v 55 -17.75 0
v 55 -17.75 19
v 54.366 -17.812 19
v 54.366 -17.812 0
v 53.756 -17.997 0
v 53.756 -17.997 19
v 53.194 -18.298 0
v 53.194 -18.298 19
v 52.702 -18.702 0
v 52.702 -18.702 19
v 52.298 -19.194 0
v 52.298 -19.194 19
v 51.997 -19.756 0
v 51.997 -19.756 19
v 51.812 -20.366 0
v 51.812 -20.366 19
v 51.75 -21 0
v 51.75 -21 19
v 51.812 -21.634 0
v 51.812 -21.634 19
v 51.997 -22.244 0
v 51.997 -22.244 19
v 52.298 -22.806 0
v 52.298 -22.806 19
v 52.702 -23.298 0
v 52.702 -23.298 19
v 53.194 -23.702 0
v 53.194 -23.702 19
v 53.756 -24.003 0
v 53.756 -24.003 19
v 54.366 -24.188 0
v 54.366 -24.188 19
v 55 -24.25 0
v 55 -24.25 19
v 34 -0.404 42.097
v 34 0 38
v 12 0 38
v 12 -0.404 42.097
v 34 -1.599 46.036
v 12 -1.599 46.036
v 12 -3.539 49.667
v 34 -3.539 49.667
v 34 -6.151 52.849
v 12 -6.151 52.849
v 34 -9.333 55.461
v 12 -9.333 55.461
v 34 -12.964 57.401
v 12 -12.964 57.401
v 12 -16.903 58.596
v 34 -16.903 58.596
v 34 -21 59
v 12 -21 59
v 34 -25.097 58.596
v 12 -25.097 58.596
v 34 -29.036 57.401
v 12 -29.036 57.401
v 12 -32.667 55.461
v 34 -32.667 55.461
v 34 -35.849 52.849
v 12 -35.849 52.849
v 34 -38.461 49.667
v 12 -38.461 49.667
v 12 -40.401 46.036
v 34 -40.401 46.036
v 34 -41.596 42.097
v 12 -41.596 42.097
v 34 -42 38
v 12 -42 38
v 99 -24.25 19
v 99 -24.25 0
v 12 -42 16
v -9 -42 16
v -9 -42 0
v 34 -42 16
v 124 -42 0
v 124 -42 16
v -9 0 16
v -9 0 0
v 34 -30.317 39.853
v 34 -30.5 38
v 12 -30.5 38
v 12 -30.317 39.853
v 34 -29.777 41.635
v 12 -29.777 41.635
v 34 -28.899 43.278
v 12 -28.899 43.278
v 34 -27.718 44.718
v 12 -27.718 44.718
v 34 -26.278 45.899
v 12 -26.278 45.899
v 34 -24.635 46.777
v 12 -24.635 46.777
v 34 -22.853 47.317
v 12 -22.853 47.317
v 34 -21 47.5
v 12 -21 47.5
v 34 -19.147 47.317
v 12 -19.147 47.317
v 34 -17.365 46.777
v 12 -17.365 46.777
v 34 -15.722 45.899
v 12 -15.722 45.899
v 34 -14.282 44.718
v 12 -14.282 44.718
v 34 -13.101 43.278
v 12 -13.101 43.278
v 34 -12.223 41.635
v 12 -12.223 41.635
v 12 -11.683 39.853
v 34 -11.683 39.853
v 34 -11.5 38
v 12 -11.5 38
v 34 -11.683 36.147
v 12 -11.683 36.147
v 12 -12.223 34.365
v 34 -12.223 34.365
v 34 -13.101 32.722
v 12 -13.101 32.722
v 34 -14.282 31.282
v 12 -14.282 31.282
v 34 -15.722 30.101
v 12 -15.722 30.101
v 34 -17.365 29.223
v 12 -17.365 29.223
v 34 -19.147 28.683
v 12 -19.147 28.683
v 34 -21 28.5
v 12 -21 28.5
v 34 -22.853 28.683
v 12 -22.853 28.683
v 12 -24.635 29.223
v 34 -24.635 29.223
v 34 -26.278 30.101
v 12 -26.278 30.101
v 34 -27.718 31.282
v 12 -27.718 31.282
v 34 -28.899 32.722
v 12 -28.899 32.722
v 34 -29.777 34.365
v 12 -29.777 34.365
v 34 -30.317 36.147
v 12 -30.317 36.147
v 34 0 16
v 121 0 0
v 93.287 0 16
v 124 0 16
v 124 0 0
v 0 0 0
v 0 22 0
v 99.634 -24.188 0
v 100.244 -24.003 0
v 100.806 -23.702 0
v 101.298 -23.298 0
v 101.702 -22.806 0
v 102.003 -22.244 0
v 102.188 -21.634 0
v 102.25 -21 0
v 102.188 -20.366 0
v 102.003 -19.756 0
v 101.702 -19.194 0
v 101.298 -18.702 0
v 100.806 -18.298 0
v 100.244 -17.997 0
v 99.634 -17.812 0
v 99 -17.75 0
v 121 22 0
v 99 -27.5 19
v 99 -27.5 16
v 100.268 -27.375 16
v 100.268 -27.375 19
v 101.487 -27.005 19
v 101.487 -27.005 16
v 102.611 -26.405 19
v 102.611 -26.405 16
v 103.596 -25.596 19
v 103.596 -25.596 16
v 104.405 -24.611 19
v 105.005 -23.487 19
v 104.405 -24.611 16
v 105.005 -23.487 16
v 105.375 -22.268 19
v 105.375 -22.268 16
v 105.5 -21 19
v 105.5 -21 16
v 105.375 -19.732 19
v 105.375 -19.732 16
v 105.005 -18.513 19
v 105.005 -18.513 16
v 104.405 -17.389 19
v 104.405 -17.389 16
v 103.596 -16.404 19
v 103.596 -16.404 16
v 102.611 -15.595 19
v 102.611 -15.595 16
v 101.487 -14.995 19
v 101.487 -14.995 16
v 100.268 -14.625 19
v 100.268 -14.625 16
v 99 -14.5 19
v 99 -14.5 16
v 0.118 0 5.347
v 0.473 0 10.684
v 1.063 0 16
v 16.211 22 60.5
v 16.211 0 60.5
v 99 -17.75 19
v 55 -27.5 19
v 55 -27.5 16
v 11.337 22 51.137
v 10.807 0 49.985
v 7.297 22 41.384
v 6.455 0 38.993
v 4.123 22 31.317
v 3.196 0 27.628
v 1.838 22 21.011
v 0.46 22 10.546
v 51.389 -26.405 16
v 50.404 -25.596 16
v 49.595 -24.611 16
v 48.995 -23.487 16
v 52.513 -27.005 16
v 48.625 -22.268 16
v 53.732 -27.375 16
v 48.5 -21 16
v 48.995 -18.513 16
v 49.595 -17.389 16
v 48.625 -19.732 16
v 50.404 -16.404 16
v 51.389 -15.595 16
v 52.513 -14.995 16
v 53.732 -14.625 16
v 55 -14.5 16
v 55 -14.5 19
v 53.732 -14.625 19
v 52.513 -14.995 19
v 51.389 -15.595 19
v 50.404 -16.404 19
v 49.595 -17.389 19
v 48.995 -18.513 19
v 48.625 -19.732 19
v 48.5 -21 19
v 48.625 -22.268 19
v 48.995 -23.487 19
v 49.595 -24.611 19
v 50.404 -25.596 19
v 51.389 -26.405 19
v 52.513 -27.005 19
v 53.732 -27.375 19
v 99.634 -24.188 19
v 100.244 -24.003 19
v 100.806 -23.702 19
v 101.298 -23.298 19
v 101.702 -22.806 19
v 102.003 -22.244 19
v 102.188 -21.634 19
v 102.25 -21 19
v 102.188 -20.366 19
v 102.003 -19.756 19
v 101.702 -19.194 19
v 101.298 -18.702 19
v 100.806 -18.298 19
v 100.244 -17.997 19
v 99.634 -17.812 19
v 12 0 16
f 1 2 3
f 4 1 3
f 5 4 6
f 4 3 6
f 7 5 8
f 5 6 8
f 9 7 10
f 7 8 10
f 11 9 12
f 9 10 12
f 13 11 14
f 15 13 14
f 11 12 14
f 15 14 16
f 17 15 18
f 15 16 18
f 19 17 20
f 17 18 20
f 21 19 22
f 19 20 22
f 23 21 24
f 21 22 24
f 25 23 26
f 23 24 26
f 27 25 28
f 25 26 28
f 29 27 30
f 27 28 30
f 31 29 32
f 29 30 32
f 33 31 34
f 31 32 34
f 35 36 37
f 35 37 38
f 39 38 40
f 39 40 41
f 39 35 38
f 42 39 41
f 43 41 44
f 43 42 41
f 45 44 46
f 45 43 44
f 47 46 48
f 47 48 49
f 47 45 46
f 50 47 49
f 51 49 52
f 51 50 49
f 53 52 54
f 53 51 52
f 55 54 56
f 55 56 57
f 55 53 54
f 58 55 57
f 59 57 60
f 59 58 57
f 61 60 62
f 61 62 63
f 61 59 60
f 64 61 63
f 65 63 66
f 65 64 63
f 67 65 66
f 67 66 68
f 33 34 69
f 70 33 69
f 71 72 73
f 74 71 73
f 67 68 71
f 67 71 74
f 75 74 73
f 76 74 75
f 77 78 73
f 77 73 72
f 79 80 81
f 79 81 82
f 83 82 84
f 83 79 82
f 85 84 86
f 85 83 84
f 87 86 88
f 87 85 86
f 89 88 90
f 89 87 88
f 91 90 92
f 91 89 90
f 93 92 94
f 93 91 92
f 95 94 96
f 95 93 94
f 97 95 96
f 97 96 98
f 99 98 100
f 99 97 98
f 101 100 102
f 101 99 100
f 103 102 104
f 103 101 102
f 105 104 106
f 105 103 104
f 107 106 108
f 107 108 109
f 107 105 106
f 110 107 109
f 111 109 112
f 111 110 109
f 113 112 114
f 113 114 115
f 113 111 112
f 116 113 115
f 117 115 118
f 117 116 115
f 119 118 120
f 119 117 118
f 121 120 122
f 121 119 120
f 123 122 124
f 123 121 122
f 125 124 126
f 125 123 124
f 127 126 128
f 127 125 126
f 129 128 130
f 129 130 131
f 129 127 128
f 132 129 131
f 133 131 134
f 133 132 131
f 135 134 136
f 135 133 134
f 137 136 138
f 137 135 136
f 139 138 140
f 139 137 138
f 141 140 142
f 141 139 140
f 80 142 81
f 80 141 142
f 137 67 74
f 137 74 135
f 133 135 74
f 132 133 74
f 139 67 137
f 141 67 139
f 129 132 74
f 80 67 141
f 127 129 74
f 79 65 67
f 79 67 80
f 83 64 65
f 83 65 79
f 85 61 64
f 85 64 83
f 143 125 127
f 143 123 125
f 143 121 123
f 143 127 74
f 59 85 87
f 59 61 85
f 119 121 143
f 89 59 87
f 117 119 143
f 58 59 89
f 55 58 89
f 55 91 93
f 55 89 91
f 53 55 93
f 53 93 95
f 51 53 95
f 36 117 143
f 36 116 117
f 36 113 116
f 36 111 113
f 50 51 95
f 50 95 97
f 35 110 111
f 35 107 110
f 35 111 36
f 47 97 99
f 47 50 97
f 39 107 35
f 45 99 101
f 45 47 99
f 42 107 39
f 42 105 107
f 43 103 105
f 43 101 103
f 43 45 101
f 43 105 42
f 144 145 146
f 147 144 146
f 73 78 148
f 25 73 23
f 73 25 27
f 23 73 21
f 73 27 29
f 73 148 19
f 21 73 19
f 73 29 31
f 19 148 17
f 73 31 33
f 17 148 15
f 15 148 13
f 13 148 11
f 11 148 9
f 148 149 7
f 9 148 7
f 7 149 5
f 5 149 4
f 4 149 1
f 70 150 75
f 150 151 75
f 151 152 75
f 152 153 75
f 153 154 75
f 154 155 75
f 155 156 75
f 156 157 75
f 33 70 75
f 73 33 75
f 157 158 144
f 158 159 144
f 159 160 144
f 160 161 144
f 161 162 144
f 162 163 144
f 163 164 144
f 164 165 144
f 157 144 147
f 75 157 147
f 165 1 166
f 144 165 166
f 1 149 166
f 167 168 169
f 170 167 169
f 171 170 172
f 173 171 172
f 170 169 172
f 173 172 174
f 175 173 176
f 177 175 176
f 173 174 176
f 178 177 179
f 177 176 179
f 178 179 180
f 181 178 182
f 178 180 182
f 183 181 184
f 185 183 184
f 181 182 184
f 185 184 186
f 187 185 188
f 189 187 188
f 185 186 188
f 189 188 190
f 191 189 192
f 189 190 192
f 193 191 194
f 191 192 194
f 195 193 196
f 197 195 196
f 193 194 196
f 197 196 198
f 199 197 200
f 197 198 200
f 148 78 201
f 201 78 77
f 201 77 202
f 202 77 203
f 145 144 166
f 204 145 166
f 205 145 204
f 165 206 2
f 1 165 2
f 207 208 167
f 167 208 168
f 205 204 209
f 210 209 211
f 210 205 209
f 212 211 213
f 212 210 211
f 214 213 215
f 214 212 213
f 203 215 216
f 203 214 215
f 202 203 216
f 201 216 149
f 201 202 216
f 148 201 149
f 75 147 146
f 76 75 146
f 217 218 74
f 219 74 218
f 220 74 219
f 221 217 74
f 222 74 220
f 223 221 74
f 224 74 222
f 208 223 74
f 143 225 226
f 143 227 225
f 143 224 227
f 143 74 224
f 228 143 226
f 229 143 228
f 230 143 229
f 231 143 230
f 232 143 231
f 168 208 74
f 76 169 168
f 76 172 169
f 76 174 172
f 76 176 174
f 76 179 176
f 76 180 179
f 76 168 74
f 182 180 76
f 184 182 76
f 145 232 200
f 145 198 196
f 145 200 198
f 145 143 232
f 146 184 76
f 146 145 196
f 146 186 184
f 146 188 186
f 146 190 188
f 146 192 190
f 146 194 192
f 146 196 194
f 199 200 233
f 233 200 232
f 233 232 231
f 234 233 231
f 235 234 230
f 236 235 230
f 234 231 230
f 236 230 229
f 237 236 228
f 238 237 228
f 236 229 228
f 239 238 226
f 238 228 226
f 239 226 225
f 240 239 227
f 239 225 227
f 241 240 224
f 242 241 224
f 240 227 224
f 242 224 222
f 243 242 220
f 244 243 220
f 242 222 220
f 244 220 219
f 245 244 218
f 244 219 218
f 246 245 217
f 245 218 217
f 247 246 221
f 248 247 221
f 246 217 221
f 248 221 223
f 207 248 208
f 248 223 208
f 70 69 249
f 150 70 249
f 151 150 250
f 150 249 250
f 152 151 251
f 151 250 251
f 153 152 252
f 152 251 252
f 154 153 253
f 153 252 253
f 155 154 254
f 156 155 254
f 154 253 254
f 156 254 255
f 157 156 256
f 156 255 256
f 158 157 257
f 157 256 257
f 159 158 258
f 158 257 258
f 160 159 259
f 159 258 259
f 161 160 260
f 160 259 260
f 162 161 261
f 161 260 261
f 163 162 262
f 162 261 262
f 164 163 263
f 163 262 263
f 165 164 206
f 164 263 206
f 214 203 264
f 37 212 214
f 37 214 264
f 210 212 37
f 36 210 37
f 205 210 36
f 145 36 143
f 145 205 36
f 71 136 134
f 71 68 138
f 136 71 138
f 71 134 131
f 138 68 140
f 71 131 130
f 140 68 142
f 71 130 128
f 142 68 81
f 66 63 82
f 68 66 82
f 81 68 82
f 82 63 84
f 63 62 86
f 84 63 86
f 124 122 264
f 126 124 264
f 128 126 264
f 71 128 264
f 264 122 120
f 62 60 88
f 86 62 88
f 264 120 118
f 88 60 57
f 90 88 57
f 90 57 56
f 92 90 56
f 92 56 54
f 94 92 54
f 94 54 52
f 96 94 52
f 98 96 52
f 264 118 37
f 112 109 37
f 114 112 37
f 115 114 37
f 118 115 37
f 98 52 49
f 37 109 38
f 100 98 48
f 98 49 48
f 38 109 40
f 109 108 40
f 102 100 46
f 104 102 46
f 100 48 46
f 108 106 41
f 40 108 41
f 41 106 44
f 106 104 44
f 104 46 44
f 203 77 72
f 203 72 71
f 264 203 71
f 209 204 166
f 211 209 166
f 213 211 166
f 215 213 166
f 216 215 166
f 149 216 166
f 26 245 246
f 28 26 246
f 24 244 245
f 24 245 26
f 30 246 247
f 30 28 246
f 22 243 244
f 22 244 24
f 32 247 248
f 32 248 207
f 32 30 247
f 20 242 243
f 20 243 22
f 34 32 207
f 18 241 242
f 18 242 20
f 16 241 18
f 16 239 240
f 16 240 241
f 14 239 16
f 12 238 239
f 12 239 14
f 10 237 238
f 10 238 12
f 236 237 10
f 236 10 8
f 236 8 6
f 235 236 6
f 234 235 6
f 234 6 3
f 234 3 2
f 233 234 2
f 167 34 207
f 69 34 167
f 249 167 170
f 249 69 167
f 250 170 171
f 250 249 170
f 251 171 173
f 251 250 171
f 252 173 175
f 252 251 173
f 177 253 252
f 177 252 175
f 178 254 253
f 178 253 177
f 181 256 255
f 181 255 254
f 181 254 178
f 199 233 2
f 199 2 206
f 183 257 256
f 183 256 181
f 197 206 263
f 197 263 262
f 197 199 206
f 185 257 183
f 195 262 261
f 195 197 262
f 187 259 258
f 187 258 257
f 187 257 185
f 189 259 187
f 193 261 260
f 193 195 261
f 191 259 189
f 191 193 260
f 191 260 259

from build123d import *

# Parameters (mm, degrees)
F1_DEPTH  = 22
F2_W      = 133
F2_H      = 16
F3_DEPTH  = 42
F4_W      = 22
F4_H      = 42
F5_DEPTH  = 22
F7_DEPTH  = 22
F8_DEPTH  = 43.001
F10_DEPTH = 3
F11_DEPTH = 16.001


with BuildPart() as f1:
    # F0 (on Front) → F1 (new body)
    with BuildSketch(Plane.XZ):
        with BuildLine():
            ThreePointArc((16.210926, 60.5), (4.122975, 31.317104), (0, 0))
            Line((0, 0), (121, 0))
            Line((121, 0), (16.210926, 60.5))
        make_face()
    extrude(amount=-F1_DEPTH)

    # F2 (on Front) → F3 (join)
    with BuildSketch(Plane.XZ):
        with Locations((57.5, 8)):
            Rectangle(F2_W, F2_H)
    extrude(amount=F3_DEPTH)

    # F4 (on face) → F5 (join)
    with BuildSketch(Plane.XY.offset(16)):
        with Locations((23, -21)):
            Rectangle(F4_W, F4_H)
    extrude(amount=F5_DEPTH)

    # F6 (on face) → F7 (join, through all)
    with BuildSketch(Plane.YZ.offset(34)):
        with BuildLine():
            ThreePointArc((-30.5, 38), (-21, 47.5), (-11.5, 38))
            Line((-11.5, 38), (0, 38))
            ThreePointArc((0, 38), (-21, 59), (-42, 38))
            Line((-42, 38), (-30.5, 38))
        make_face()
    extrude(amount=-F7_DEPTH)

    # F6 (on face) → F8 (cut, through all)
    with BuildSketch(Plane.YZ.offset(34)):
        with BuildLine():
            ThreePointArc((-30.5, 38), (-21, 28.5), (-11.5, 38))
            Line((-11.5, 38), (-30.5, 38))
        make_face()
    extrude(amount=-F8_DEPTH, mode=Mode.SUBTRACT)

    # F9 (on face) → F10 (join)
    with BuildSketch(Plane.XY.offset(16)):
        with BuildLine():
            ThreePointArc((55, -14.5), (48.5, -21), (55, -27.5))
            Line((55, -27.5), (99, -27.5))
            ThreePointArc((99, -27.5), (105.5, -21), (99, -14.5))
            Line((99, -14.5), (55, -14.5))
        make_face()
        with BuildLine():
            Line((99, -24.25), (55, -24.25))
            ThreePointArc((55, -24.25), (51.75, -21), (55, -17.75))
            Line((55, -17.75), (99, -17.75))
            ThreePointArc((99, -17.75), (102.25, -21), (99, -24.25))
        make_face(mode=Mode.SUBTRACT)
    extrude(amount=F10_DEPTH)

    # F10_face (on face) → F11 (cut, through all)
    with BuildSketch(Plane(origin=(77, -21, 16), x_dir=(1, 0, 0), z_dir=(0, 0, 1))):
        with BuildLine():
            ThreePointArc((22, -3.25), (25.25, 0), (22, 3.25))
            Line((22, 3.25), (-22, 3.25))
            ThreePointArc((-22, 3.25), (-25.25, 0), (-22, -3.25))
            Line((-22, -3.25), (22, -3.25))
        make_face()
    extrude(amount=-F11_DEPTH, mode=Mode.SUBTRACT)


solid = f1.part
